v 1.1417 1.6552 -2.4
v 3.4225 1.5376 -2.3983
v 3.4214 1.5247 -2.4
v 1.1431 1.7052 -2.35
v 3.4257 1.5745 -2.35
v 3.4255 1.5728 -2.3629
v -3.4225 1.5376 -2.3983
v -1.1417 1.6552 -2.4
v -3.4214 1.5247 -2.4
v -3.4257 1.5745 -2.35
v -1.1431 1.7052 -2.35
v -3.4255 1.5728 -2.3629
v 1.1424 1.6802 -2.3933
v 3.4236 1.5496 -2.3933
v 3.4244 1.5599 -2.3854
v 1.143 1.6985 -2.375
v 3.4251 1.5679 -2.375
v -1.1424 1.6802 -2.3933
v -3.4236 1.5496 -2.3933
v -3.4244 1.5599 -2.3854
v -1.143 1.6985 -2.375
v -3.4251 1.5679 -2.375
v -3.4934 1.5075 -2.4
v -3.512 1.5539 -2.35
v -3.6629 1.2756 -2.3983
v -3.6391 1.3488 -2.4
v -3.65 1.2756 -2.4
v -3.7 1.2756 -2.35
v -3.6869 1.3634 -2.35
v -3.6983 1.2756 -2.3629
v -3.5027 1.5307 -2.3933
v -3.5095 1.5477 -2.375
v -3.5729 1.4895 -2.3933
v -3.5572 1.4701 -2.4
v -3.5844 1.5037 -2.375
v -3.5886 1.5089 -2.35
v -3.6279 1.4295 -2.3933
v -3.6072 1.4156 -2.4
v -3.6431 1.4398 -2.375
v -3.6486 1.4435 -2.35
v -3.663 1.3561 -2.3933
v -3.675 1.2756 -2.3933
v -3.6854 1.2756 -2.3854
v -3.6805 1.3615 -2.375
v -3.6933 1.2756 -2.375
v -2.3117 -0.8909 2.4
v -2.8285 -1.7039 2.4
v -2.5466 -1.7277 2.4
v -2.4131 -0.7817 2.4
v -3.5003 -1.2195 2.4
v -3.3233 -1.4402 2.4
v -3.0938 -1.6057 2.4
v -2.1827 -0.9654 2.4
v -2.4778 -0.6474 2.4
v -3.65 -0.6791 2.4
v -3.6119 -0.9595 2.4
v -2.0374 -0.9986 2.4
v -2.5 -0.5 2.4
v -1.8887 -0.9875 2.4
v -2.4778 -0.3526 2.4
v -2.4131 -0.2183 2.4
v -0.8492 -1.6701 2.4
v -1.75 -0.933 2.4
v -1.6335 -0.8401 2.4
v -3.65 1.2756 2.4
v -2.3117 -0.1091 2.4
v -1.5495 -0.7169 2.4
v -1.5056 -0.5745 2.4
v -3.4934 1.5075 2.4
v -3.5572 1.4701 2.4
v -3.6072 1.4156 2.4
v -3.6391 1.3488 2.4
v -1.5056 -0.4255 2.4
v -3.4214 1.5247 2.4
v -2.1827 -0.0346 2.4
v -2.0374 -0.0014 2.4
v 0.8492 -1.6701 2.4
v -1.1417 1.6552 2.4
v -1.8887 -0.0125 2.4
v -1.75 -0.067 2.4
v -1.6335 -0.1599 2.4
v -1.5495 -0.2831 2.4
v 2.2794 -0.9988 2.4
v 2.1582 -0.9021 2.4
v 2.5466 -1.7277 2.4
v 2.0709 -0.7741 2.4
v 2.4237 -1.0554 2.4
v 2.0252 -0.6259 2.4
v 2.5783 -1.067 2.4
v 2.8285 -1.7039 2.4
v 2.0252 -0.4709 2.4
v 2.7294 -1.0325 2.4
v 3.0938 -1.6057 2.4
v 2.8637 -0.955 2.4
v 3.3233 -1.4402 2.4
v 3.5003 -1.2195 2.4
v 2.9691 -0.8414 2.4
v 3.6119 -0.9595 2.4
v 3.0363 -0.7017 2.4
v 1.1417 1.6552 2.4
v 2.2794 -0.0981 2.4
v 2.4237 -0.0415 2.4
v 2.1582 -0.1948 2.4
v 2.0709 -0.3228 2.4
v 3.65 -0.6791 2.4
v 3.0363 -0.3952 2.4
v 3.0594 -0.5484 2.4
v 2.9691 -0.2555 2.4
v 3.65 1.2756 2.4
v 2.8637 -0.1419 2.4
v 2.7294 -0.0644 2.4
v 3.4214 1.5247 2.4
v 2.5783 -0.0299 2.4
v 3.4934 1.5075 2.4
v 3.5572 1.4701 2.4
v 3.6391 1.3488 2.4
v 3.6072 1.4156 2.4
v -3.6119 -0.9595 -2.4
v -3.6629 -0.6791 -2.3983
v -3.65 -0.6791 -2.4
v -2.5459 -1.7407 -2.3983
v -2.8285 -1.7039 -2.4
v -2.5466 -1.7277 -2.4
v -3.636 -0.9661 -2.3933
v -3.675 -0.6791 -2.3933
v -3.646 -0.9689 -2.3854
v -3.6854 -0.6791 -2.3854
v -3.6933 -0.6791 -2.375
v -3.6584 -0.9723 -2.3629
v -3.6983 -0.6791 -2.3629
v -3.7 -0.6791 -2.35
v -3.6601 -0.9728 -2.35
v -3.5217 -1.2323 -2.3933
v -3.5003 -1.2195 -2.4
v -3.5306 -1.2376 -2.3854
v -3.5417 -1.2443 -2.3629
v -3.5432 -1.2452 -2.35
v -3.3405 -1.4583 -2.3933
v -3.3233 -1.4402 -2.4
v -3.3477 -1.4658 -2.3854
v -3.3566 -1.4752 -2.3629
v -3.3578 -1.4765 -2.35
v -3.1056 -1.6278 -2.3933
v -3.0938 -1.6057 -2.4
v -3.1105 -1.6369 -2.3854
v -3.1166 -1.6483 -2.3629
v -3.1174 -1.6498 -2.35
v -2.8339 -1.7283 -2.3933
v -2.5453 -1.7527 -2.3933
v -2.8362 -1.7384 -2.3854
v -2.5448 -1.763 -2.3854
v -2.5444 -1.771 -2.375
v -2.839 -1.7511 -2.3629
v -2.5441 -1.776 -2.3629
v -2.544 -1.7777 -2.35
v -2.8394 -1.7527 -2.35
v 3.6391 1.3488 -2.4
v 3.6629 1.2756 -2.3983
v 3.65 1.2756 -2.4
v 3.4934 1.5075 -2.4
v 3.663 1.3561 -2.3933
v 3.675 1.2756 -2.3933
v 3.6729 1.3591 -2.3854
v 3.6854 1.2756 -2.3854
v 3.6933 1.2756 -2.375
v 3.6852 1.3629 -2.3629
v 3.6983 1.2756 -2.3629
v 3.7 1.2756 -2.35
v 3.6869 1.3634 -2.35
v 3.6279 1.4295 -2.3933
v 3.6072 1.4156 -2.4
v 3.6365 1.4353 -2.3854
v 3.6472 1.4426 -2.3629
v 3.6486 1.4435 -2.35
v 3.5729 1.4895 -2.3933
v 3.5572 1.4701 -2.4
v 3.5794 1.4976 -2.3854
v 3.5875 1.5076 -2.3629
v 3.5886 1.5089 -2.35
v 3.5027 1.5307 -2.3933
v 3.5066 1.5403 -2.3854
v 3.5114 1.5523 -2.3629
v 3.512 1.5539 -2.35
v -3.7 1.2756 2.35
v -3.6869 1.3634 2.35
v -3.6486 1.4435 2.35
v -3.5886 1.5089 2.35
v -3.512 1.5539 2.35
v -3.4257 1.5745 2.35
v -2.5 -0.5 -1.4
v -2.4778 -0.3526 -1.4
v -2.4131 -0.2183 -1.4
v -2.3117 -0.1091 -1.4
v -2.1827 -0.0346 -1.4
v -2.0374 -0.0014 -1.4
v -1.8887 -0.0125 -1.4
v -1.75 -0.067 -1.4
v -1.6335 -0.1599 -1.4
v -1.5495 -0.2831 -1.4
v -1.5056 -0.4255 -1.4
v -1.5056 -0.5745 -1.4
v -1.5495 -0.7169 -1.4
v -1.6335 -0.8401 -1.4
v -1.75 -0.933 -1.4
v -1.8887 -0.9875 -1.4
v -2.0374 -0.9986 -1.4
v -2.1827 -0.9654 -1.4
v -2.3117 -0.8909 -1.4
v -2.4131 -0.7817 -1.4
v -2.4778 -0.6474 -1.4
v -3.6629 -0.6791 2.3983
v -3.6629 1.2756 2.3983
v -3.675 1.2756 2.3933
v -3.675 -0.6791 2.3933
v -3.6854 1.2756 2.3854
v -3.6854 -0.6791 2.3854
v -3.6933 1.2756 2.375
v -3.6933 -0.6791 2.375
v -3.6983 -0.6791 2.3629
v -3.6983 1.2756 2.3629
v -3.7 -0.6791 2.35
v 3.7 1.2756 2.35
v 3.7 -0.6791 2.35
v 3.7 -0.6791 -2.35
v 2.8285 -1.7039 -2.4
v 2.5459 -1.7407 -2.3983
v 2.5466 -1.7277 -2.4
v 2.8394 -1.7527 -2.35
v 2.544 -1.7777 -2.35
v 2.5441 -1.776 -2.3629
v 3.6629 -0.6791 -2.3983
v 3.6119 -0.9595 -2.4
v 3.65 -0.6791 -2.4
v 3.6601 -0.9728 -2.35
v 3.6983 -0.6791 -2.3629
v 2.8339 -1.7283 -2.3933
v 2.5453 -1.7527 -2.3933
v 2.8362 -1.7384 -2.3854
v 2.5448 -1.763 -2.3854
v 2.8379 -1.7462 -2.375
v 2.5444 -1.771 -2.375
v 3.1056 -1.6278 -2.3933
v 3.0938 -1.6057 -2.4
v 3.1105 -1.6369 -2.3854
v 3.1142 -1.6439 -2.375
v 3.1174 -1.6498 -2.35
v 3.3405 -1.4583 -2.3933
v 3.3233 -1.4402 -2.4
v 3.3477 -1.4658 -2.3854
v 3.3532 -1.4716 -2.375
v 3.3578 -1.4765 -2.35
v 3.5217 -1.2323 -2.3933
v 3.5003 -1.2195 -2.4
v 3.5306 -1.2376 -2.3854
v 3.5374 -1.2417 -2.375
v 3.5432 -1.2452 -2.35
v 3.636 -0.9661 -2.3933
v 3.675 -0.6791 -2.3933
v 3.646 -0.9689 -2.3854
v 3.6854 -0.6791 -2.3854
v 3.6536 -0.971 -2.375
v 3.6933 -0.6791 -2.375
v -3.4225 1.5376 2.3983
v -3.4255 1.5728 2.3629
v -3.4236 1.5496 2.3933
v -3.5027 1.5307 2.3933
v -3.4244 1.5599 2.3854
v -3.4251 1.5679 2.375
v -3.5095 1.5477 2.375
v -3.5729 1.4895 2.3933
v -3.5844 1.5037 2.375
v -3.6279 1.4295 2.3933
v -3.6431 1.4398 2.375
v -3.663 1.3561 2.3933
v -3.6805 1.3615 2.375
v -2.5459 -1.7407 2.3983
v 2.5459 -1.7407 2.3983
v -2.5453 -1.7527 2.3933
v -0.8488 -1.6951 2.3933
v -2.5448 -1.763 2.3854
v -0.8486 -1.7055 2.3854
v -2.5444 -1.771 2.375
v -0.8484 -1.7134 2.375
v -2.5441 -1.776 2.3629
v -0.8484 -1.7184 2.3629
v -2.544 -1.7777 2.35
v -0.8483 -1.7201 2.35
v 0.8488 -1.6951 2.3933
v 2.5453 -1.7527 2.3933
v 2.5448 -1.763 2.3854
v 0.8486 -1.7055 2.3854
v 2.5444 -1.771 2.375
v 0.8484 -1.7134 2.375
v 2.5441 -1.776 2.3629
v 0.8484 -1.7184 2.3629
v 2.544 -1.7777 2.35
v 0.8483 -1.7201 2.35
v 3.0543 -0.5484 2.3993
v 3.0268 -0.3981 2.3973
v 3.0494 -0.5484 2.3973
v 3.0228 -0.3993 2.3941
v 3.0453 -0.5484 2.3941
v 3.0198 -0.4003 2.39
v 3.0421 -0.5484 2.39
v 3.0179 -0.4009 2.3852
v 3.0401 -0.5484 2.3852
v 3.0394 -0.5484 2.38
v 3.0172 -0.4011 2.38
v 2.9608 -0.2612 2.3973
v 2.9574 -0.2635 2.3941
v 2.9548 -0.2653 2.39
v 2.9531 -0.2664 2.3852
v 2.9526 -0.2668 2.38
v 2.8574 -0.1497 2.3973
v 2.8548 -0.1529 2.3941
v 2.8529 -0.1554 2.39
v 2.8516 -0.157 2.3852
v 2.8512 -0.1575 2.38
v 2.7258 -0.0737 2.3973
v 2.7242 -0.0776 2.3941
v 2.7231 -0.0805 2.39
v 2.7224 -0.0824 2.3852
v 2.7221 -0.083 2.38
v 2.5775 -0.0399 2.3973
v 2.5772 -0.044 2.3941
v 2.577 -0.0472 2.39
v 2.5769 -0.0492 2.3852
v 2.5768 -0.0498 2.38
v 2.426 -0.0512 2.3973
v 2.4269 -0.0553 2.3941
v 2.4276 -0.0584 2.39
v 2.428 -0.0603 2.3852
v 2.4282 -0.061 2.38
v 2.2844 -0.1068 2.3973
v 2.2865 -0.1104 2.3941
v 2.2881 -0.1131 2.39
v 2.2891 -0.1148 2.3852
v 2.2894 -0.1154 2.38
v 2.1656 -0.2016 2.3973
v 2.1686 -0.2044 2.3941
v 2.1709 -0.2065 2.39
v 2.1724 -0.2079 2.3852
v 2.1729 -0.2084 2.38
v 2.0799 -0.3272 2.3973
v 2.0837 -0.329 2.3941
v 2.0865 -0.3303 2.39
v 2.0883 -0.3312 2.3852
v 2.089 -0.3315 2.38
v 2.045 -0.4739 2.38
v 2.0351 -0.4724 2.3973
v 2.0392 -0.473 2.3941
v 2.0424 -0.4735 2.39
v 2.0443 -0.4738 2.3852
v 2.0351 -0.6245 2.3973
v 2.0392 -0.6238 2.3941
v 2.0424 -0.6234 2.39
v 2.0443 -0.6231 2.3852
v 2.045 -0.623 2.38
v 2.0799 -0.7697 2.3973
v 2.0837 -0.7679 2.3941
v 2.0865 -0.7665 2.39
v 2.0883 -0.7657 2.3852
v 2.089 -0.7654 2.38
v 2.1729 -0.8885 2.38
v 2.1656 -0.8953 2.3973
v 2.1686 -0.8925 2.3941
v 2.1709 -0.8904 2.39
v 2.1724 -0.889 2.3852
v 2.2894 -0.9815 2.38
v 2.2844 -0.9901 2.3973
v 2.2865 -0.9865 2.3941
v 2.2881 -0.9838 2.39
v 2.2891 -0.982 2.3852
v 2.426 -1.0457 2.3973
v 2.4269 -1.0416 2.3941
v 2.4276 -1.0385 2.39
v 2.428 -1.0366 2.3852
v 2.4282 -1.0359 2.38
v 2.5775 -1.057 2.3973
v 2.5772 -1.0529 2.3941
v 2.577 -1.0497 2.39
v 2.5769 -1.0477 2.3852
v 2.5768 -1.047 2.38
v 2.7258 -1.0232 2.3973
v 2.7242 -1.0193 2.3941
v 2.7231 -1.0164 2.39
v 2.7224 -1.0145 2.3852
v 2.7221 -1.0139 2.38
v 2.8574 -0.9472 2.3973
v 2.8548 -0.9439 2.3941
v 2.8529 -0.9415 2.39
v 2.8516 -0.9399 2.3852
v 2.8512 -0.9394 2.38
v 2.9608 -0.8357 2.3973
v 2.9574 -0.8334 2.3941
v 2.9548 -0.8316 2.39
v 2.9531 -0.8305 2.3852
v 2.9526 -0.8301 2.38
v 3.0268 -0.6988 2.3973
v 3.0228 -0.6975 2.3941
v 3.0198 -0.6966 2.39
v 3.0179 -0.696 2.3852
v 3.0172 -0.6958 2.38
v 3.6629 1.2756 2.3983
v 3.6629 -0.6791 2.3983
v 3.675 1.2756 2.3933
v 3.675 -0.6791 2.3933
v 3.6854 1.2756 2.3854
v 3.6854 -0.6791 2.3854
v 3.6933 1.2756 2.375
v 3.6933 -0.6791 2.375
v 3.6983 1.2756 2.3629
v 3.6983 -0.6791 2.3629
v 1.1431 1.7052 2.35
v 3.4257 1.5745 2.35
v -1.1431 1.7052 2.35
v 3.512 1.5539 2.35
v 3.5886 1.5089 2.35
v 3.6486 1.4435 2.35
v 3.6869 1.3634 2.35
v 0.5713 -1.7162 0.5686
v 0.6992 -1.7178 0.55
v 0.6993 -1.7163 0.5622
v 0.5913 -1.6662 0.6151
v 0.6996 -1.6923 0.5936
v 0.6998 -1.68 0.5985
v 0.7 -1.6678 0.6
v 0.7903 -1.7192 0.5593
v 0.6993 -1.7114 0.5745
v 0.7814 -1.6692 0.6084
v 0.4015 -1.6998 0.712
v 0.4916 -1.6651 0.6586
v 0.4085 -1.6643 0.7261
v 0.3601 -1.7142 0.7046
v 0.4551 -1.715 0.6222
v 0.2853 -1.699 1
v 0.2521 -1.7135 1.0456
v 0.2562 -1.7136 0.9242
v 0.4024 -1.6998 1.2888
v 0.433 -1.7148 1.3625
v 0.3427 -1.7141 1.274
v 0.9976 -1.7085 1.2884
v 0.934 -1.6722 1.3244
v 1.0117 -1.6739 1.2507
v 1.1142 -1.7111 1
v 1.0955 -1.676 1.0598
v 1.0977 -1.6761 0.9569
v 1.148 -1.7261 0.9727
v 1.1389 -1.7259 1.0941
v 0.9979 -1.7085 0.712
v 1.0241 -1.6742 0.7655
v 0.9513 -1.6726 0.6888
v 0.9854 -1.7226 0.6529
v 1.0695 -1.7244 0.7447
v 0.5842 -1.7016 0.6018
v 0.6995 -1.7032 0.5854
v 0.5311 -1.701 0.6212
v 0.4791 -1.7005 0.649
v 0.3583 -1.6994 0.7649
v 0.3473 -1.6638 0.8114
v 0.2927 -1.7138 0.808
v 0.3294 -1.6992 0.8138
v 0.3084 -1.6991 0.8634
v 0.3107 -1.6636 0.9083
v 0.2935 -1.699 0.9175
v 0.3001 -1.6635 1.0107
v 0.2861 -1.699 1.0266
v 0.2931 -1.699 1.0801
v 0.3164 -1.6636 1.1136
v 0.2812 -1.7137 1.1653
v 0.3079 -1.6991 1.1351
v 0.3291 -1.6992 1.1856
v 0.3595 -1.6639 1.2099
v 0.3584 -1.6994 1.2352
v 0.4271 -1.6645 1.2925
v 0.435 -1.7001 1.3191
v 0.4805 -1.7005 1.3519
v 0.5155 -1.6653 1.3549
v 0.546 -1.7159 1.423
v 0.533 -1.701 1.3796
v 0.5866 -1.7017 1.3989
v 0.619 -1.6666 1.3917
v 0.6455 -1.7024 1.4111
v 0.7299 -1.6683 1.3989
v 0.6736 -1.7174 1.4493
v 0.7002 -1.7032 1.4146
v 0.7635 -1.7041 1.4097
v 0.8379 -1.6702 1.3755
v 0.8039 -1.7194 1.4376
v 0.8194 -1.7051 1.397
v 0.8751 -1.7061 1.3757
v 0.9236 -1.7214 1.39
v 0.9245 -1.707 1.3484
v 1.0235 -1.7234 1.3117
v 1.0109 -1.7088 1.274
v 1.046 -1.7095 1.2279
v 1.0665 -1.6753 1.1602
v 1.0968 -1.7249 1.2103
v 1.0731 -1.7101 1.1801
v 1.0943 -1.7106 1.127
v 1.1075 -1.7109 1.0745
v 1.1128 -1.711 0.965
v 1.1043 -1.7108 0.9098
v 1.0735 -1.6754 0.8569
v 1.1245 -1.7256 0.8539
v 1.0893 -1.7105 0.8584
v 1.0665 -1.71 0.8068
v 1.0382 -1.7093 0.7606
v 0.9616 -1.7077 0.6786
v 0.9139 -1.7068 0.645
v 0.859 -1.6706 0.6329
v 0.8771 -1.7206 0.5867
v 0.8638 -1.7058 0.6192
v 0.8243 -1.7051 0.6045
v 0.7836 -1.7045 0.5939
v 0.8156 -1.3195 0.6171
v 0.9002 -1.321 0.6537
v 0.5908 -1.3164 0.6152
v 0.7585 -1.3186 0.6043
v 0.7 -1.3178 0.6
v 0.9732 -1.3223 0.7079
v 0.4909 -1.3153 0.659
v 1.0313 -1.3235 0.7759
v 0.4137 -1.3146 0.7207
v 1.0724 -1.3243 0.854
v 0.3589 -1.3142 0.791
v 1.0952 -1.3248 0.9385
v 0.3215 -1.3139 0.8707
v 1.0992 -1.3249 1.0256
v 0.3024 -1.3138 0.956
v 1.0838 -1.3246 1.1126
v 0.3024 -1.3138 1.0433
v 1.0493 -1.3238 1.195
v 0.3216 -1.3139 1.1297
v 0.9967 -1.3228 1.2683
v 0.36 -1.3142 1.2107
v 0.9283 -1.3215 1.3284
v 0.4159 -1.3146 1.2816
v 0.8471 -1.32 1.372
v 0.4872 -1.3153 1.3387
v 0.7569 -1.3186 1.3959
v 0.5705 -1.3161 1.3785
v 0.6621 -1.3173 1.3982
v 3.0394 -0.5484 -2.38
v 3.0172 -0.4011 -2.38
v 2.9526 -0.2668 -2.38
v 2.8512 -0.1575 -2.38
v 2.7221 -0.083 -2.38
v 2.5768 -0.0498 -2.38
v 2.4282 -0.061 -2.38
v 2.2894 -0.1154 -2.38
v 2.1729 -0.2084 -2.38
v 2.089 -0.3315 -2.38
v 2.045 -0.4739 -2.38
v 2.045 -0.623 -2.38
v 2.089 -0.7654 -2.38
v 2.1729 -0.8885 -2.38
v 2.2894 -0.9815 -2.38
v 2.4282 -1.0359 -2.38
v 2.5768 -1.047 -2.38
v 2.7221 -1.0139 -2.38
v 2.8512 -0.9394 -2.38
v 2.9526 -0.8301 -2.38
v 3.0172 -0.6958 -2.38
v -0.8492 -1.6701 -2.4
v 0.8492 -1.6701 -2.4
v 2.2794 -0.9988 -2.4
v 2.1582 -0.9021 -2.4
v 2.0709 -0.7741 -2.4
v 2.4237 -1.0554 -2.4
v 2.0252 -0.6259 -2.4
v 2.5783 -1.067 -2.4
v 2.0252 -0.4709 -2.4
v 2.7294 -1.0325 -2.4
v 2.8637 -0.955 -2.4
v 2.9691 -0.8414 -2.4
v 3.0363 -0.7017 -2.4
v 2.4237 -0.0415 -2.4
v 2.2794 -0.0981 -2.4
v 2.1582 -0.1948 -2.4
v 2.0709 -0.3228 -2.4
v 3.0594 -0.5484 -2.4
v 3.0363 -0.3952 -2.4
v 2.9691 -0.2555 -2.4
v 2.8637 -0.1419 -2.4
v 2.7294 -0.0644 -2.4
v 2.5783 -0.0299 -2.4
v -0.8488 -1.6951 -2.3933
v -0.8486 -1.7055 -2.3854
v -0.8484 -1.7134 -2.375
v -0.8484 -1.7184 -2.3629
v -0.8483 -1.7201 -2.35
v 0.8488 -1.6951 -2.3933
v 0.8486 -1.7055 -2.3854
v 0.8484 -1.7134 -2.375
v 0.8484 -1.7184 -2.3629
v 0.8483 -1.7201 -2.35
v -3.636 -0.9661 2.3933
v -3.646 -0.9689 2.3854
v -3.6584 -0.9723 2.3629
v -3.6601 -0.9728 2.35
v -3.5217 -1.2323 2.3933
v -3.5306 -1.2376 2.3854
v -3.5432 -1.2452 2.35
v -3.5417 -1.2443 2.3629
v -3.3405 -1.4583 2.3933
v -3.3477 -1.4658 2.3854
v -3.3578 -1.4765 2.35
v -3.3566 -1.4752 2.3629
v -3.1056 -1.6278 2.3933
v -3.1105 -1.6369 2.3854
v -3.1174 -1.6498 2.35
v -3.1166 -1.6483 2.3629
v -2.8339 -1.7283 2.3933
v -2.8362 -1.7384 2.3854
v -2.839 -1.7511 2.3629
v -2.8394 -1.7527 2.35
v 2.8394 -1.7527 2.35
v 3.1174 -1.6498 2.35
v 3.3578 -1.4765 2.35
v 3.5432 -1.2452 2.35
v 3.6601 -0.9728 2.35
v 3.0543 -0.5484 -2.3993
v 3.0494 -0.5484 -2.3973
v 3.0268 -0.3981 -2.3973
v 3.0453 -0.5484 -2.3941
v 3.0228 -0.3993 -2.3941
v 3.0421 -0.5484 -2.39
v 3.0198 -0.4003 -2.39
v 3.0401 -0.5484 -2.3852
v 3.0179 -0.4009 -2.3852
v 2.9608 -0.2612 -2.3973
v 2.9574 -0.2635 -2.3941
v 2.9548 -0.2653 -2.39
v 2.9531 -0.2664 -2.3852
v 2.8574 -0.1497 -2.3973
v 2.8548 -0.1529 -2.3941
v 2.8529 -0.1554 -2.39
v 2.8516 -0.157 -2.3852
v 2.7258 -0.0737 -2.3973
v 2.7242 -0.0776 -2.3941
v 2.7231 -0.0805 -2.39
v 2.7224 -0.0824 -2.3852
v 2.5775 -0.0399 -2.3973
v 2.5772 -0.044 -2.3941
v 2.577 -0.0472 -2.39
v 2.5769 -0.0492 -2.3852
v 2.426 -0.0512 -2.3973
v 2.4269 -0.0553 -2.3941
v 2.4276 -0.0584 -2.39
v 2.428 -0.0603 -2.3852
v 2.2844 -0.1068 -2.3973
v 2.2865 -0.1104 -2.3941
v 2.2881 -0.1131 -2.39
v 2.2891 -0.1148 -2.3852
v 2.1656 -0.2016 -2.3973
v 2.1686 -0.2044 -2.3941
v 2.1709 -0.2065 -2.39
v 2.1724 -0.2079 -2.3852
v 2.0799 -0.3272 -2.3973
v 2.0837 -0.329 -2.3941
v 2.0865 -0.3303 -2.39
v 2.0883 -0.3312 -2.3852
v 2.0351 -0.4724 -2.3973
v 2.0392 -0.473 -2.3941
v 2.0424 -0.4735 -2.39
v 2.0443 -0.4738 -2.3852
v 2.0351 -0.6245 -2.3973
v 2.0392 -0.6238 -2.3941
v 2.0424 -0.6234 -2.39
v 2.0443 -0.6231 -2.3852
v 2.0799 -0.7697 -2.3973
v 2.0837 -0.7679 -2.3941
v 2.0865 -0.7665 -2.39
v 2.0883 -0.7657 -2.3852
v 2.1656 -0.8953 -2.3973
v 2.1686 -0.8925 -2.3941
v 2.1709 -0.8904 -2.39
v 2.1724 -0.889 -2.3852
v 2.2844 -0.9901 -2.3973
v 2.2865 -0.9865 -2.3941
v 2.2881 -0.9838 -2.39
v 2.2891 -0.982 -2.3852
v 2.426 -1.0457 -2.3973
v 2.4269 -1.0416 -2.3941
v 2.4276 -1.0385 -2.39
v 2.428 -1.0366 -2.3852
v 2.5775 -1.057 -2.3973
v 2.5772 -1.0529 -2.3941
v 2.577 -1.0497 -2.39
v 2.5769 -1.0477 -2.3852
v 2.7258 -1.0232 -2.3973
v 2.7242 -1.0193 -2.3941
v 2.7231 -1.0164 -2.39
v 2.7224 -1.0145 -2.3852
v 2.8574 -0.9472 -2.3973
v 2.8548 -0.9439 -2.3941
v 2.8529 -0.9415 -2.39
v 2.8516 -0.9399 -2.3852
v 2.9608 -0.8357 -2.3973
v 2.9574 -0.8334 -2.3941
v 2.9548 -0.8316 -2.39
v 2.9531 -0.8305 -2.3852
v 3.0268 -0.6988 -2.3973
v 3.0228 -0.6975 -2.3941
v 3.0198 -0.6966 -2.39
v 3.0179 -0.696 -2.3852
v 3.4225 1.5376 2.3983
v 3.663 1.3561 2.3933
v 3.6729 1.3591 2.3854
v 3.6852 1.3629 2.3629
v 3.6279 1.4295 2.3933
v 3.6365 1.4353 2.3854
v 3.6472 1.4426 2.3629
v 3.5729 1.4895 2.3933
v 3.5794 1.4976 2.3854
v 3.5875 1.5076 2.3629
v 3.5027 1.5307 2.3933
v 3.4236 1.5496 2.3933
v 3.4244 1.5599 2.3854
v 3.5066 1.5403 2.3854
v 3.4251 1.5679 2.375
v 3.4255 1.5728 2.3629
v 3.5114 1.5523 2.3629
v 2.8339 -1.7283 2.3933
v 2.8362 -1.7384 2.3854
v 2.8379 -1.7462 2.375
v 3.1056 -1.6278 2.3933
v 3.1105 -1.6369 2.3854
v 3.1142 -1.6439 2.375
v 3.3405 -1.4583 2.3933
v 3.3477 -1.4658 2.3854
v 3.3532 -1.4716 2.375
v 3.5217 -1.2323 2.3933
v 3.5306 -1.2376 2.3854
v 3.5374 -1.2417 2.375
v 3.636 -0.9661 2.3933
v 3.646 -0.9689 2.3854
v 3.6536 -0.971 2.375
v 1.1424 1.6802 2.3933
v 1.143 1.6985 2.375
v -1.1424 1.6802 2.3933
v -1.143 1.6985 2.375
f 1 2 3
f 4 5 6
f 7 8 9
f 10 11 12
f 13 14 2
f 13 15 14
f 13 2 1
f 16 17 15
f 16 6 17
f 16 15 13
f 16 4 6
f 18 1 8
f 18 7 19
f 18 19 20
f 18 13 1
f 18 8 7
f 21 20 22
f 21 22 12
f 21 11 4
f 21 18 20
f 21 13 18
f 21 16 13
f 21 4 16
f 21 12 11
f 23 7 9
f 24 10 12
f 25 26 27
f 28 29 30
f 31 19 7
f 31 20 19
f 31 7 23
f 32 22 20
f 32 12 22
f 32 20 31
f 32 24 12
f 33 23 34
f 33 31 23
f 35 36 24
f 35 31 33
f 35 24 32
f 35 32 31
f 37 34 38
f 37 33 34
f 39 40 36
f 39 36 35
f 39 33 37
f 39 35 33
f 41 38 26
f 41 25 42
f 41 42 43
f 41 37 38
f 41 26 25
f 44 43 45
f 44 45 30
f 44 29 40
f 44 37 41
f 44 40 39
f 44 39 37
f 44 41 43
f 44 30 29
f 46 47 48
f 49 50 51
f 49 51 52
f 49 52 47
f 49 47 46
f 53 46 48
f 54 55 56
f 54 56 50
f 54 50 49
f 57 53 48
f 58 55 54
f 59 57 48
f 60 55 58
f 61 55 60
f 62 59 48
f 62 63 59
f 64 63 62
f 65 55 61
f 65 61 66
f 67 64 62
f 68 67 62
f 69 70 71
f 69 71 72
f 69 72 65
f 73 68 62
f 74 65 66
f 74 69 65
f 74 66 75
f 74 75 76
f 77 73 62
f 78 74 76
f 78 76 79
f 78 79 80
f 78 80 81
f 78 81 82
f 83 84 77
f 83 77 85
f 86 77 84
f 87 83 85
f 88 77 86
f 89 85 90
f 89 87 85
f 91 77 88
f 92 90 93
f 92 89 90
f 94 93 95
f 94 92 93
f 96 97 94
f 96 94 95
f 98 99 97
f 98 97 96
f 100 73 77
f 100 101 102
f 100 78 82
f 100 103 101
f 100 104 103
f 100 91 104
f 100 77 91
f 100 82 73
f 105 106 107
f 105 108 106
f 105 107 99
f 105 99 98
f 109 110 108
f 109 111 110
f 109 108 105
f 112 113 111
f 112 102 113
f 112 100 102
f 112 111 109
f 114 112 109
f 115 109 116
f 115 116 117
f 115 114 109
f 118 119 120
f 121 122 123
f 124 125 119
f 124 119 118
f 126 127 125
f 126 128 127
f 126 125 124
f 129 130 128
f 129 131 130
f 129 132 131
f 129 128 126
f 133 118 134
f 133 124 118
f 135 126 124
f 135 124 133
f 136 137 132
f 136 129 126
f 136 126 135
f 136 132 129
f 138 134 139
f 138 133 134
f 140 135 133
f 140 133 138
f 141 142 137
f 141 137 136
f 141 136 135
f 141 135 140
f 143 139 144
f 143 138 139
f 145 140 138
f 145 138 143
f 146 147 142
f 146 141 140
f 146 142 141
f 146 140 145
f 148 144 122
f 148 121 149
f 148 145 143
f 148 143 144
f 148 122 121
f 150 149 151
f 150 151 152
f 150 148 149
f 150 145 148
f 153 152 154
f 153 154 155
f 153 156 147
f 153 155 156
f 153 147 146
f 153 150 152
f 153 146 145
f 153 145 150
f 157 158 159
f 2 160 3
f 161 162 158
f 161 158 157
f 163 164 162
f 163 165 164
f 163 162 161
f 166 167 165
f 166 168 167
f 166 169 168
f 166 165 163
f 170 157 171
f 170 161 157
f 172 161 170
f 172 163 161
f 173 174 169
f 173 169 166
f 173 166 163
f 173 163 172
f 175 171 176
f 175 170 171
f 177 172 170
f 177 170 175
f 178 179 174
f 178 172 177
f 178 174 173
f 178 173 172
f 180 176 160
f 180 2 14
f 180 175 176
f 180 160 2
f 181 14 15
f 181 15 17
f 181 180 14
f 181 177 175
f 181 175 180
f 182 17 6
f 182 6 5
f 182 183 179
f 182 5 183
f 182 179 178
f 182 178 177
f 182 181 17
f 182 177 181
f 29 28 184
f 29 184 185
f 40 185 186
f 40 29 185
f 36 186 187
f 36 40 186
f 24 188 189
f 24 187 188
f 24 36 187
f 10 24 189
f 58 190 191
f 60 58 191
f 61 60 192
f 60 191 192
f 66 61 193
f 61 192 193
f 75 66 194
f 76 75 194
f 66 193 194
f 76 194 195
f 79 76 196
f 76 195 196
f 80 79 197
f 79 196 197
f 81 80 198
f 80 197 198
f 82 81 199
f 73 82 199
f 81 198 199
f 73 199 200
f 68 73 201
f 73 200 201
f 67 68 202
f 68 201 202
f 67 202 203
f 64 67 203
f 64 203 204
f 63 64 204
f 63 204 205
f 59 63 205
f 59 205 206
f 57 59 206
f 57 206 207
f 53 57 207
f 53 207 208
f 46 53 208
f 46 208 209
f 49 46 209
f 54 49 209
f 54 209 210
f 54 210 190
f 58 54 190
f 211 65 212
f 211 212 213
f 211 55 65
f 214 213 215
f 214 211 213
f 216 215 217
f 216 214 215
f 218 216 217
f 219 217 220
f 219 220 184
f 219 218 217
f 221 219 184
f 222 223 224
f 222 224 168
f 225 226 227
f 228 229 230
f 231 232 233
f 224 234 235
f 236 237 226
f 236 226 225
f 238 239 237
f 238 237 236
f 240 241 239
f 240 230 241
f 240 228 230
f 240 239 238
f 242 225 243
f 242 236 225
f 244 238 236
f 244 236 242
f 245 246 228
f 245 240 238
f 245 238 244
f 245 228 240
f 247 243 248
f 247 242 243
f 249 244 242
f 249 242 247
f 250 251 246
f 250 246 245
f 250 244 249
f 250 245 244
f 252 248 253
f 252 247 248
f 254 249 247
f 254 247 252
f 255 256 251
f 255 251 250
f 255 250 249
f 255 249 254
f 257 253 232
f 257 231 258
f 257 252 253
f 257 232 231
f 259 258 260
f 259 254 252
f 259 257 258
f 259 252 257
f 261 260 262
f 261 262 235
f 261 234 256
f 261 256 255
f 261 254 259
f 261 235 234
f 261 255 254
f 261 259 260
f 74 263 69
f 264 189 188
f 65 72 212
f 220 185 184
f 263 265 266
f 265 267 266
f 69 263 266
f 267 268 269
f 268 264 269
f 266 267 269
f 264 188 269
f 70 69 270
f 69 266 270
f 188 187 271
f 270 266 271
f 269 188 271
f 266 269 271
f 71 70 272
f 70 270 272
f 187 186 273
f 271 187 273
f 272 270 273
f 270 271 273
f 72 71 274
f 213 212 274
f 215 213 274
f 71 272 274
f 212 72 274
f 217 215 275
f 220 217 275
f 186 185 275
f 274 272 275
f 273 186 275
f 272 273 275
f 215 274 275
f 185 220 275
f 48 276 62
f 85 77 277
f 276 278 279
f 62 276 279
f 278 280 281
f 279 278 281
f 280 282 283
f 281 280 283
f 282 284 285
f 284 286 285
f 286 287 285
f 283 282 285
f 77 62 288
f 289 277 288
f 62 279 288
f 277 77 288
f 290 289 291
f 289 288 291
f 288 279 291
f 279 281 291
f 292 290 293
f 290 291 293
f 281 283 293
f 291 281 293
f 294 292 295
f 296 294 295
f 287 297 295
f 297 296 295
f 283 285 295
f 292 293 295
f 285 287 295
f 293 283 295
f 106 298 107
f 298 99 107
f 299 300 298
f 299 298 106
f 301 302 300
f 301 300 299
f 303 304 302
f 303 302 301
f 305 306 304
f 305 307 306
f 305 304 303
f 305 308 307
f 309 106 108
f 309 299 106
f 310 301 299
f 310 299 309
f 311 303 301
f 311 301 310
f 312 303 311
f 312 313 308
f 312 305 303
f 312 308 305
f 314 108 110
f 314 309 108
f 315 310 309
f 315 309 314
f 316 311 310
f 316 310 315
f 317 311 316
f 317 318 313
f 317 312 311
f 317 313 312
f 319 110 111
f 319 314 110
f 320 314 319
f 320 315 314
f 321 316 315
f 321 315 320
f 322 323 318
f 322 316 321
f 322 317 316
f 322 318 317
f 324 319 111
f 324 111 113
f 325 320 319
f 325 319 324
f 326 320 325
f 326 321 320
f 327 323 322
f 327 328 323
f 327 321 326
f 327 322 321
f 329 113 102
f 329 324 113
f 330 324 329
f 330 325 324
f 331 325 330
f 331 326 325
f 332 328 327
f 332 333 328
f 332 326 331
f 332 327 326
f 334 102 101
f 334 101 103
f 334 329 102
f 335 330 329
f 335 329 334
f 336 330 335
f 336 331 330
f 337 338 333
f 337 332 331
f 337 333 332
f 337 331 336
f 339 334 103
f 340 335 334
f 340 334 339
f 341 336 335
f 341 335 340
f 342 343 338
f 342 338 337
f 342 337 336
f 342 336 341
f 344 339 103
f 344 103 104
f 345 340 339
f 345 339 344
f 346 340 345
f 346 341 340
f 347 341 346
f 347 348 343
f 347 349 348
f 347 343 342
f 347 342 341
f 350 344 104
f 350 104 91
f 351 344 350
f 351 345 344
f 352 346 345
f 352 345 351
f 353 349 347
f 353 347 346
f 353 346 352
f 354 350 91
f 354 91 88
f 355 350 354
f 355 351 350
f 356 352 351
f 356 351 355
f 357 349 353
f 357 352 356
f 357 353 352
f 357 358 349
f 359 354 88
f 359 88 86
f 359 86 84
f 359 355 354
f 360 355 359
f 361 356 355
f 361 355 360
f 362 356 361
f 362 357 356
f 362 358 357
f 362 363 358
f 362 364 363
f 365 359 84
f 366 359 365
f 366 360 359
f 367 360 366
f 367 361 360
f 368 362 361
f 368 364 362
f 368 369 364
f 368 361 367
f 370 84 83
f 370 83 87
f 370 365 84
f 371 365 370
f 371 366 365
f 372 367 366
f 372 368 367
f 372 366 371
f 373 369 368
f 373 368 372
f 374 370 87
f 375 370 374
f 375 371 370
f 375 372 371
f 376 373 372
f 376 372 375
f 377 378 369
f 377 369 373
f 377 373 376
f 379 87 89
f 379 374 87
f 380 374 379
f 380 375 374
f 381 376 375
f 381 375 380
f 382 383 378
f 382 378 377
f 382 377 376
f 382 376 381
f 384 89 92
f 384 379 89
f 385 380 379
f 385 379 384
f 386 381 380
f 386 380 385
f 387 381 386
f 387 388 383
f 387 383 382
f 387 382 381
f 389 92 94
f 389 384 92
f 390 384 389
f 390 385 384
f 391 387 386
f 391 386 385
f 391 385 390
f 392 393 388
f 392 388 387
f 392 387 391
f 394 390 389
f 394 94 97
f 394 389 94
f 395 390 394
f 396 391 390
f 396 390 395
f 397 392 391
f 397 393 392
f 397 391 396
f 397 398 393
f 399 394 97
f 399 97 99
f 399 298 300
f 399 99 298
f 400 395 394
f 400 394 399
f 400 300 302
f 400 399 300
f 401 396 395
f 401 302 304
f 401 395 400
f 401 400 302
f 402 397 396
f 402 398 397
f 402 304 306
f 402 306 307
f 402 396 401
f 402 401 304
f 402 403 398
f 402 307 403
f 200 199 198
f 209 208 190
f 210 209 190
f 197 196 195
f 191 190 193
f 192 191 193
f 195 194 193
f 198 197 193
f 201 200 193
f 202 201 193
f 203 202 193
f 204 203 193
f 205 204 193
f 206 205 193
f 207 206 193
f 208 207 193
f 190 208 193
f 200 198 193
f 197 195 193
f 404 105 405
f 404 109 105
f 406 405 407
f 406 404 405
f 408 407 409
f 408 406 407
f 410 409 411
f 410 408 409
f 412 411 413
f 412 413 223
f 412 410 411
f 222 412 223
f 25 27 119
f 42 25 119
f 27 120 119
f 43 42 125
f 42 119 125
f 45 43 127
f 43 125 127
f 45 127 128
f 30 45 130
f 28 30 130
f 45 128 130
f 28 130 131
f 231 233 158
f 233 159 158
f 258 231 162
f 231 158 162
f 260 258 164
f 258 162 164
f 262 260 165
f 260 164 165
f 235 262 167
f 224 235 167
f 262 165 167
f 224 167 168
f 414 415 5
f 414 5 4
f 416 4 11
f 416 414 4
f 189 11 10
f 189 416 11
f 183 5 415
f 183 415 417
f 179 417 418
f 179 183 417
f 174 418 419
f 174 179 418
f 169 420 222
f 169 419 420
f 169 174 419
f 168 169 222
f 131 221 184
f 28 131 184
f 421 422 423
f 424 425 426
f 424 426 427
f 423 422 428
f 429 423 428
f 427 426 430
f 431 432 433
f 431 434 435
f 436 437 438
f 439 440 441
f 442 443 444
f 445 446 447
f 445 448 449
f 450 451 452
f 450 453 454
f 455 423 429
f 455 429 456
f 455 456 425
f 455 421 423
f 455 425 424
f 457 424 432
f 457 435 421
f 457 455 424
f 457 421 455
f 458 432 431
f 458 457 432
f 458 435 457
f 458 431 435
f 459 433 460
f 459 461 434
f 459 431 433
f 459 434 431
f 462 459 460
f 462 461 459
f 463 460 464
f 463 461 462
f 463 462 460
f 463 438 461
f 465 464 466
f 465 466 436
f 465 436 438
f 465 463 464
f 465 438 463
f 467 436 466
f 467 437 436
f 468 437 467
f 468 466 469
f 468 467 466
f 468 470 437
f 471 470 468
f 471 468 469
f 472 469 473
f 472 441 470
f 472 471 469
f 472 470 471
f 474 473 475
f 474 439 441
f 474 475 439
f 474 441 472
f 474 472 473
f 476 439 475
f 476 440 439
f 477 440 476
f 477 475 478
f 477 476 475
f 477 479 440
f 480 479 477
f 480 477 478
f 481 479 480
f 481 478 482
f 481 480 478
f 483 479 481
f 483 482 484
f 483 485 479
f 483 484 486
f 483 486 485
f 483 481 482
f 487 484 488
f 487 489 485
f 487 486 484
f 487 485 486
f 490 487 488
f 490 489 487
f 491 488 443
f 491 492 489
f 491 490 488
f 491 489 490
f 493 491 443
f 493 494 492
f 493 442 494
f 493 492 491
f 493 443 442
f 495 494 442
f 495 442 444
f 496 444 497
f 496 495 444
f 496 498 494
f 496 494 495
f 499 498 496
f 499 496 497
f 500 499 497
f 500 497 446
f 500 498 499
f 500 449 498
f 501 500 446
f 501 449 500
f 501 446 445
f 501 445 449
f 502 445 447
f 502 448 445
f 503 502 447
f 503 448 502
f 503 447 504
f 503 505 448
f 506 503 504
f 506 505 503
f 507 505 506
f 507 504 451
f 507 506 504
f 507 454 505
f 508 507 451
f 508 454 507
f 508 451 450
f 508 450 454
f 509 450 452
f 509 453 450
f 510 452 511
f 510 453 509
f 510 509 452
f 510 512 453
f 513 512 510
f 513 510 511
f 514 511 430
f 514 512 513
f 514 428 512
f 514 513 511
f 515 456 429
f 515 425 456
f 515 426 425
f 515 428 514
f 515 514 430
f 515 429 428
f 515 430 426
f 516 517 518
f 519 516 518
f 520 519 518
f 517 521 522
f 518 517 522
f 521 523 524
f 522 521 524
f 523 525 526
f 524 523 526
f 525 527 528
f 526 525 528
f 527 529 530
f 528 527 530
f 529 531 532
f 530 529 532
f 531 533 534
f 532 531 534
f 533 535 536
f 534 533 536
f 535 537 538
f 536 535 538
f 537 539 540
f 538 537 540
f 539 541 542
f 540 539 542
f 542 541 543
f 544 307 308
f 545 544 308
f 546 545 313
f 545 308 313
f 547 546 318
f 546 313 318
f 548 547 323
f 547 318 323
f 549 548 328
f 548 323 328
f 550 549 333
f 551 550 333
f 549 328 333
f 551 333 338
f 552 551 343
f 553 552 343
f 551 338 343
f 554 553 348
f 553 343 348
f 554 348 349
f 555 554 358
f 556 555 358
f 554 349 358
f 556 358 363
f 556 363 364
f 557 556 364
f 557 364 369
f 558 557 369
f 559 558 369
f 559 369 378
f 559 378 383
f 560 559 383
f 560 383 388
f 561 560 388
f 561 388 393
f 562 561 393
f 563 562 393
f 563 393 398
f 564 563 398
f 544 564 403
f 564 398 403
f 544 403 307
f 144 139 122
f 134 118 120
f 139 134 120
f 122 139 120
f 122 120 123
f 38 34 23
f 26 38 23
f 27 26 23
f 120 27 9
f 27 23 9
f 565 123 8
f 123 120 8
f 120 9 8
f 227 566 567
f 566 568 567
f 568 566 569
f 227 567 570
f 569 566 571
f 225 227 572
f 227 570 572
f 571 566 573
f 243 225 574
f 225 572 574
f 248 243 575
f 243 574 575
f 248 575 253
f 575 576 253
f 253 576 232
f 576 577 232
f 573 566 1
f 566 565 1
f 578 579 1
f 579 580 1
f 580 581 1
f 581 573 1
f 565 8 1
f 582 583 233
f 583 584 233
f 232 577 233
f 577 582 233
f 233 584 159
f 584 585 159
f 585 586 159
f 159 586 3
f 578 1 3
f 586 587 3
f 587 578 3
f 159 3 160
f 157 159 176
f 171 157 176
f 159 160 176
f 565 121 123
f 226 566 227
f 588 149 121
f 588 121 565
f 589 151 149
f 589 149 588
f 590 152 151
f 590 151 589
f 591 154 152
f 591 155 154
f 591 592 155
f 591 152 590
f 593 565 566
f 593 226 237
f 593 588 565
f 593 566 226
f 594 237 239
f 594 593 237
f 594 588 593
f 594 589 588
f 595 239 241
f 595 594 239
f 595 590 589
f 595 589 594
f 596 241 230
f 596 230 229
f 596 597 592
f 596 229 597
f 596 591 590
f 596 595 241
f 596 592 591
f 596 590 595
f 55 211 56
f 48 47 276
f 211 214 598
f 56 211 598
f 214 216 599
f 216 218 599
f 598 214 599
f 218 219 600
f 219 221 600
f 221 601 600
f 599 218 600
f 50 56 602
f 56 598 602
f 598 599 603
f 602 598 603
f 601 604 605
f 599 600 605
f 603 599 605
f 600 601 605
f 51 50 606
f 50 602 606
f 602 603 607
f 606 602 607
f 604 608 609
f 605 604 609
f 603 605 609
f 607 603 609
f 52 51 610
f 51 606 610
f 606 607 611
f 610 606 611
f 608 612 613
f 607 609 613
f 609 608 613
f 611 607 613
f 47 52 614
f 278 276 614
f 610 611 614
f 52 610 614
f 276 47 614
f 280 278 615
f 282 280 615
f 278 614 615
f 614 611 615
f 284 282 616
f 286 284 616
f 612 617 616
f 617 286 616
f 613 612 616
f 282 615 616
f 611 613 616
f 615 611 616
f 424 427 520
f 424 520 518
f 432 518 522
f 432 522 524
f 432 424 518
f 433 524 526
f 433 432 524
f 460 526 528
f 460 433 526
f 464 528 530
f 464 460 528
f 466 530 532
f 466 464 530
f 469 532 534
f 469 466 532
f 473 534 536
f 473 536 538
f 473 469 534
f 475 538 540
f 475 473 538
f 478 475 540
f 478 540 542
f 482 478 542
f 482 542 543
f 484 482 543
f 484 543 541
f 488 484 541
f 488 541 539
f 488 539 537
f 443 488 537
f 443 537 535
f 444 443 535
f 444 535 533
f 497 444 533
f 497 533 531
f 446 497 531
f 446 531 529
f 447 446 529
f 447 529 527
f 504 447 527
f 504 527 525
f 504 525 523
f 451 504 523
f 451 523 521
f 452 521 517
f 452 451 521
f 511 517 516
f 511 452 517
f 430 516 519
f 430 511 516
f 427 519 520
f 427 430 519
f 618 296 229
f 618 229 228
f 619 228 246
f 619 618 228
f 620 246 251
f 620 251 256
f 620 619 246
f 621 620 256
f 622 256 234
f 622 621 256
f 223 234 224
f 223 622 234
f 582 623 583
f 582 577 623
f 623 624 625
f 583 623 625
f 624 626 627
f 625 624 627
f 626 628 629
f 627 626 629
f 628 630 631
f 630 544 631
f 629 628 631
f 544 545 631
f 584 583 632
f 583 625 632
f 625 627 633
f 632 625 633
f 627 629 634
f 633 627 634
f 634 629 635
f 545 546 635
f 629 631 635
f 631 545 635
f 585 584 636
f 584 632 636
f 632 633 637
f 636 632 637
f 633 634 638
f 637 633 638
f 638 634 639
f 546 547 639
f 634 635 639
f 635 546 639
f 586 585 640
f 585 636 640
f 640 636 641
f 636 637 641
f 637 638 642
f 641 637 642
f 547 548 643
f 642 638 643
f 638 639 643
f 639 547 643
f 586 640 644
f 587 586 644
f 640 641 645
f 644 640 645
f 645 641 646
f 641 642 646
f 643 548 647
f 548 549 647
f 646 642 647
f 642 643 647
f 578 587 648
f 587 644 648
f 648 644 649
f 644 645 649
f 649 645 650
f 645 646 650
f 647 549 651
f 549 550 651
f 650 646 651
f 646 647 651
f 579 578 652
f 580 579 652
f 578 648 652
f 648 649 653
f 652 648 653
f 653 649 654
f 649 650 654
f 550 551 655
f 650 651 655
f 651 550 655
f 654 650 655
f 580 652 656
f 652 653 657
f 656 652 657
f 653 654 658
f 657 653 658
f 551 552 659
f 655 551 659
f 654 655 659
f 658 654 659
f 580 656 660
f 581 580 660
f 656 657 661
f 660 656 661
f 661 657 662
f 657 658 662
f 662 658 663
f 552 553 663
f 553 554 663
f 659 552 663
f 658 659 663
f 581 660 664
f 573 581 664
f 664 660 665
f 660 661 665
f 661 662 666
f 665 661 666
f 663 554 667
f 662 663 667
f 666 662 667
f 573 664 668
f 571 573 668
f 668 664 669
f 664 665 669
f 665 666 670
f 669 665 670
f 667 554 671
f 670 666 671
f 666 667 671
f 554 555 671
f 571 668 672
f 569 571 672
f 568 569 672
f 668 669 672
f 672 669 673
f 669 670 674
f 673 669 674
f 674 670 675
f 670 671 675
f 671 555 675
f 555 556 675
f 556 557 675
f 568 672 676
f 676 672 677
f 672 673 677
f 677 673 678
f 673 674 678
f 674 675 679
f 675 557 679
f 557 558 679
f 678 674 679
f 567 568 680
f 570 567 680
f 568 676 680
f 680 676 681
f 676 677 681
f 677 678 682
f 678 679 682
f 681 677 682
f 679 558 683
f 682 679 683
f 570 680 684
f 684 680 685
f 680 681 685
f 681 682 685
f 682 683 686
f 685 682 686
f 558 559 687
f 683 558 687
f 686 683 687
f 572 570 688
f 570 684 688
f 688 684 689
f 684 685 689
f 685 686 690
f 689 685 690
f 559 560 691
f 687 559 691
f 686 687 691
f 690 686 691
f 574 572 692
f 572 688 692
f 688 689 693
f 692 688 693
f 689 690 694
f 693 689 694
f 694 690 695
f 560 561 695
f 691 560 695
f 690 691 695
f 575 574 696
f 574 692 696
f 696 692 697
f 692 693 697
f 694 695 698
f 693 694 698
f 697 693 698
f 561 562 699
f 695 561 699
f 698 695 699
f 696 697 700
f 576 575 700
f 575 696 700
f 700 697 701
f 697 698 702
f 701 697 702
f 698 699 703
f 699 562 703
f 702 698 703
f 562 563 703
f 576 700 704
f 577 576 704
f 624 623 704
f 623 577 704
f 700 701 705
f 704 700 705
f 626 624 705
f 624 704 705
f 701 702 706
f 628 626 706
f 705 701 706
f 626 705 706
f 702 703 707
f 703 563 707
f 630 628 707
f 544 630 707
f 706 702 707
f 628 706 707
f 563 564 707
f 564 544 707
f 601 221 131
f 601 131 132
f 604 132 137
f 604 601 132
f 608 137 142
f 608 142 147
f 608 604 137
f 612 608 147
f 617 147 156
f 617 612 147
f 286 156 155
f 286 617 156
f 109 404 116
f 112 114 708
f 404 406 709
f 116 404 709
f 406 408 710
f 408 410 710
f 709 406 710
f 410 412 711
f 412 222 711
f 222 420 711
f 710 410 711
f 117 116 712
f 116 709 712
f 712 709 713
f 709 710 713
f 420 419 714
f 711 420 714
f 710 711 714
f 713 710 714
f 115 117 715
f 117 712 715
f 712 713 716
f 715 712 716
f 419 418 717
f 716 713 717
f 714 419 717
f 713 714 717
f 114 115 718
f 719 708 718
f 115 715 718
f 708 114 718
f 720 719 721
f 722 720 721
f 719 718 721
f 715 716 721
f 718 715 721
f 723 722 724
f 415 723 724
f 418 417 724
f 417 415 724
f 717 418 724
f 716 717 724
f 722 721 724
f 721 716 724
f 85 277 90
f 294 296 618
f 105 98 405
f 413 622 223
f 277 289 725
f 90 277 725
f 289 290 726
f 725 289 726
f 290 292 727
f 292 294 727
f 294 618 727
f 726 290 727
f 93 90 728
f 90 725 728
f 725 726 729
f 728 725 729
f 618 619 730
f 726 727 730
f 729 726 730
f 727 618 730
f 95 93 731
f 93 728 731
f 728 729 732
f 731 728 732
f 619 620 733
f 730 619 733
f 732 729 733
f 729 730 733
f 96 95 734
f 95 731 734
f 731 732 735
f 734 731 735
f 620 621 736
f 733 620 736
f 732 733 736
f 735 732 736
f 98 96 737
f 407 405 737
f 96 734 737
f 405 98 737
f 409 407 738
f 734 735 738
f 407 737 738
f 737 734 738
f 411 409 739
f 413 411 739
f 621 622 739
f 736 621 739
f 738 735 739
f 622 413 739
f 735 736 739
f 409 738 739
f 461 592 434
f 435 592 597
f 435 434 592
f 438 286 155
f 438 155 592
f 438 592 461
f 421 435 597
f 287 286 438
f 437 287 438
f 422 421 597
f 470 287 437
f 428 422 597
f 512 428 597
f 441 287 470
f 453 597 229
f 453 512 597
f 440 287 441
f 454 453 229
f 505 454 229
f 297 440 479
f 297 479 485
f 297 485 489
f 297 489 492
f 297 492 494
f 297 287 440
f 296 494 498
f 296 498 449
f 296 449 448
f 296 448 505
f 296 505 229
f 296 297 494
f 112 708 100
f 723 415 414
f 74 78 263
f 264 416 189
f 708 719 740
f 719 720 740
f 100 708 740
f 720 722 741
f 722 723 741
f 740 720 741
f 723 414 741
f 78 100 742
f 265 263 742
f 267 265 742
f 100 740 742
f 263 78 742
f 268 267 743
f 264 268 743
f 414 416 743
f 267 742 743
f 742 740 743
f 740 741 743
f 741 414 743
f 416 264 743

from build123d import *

# Parameters (mm, degrees)
SKETCH1_W               = 7.4
SKETCH1_H               = 3.7
BOSS_EXTRUDE1_DEPTH     = 2.4
CUT_EXTRUDE1_DEPTH      = 4.8
FILLET1_R               = 1.1
FILLET2_R               = 0.3
FILLET3_R               = 0.05
CUT_EXTRUDE2_START      = -1
SKETCH3_R               = 0.5
CUT_EXTRUDE2_DEPTH      = 7.4
FILLET4_R               = 0.02
CUT_EXTRUDE3_START      = -1
SKETCH4_R               = 0.5
CUT_EXTRUDE3_DEPTH      = 4.5
CUT_EXTRUDE4_REACH      = 16.756
CUT_EXTRUDE4_END_RADIUS = 50.4
CUT_EXTRUDE4_START      = -10
SKETCH5_R               = 0.4
FILLET5_R               = 0.05


with BuildPart() as part:
    # Sketch1 → Boss-Extrude1 (new, symmetric)
    with BuildSketch(Plane.XY):
        Rectangle(SKETCH1_W, SKETCH1_H)
    extrude(amount=BOSS_EXTRUDE1_DEPTH, both=True)

    # Sketch2 → Cut-Extrude1 (cut)
    with BuildSketch(Plane.XY.offset(2.4)):
        with BuildLine():
            Line((-3.7, 1.55), (-7.120690005, 4.011417256))
            Line((-7.120690005, 4.011417256), (5.535860742, 3.886722174))
            Line((5.535860742, 3.886722174), (3.7, 1.55))
            ThreePointArc((3.7, 1.55), (0, 1.721492621), (-3.7, 1.55))
        make_face()
        with BuildLine():
            Line((3.7, -1.85), (0.350623614, -3.782025322))
            Line((0.350623614, -3.782025322), (-3.7, -1.85))
            ThreePointArc((-3.7, -1.85), (0, -1.712912069), (3.7, -1.85))
        make_face()
    extrude(amount=-CUT_EXTRUDE1_DEPTH, mode=Mode.SUBTRACT)

    # Fillet1
    fillet1_edges = [part.edges().sort_by_distance(p)[0] for p in [
        (3.7, -1.85, 0),
        (-3.7, -1.85, 0),
    ]]
    fillet(fillet1_edges, radius=FILLET1_R)

    # Fillet2
    fillet2_edges = [part.edges().sort_by_distance(p)[0] for p in [
        (3.7, 1.55, 0),
        (-3.7, 1.55, 0),
    ]]
    fillet(fillet2_edges, radius=FILLET2_R)

    # Fillet3
    fillet3_edges = [part.edges().sort_by_distance(p)[0] for p in [
        (3.7, 0.298266493, -2.4),
        (3.7, 0.298266493, 2.4),
        (0, -1.712912069, -2.4),
        (-3.35777122, -1.476459629, -2.4),
        (3.35777122, -1.476459629, -2.4),
        (0, -1.712912069, 2.4),
        (-3.35777122, -1.476459629, 2.4),
        (3.35777122, -1.476459629, 2.4),
        (0, 1.721492621, 2.4),
        (-3.7, 0.298266493, 2.4),
        (-3.621029193, 1.478477738, 2.4),
        (3.621029193, 1.478477738, 2.4),
        (0, 1.721492621, -2.4),
        (-3.7, 0.298266493, -2.4),
        (-3.621029193, 1.478477738, -2.4),
        (3.621029193, 1.478477738, -2.4),
    ]]
    fillet(fillet3_edges, radius=FILLET3_R)

    # Sketch3 → Cut-Extrude2 (cut, symmetric)
    with BuildSketch(Plane.XY.offset(2.4).offset(CUT_EXTRUDE2_START)):
        with Locations((2.539436079, -0.548443568)):
            Circle(SKETCH3_R)
    extrude(amount=CUT_EXTRUDE2_DEPTH, both=True, mode=Mode.SUBTRACT)

    # Fillet4
    fillet4_edges = [part.edges().sort_by_distance(p)[0] for p in [
        (2.039436079, -0.548443568, 2.4),
        (2.039436079, -0.548443568, -2.4),
    ]]
    fillet(fillet4_edges, radius=FILLET4_R)

    # Sketch4 → Cut-Extrude3 (cut)
    with BuildSketch(Plane(origin=(0, 0, -2.4), x_dir=(-1, 0, 0), z_dir=(0, 0, -1)).offset(CUT_EXTRUDE3_START)):
        with Locations((2, -0.5)):
            Circle(SKETCH4_R)
    extrude(amount=-CUT_EXTRUDE3_DEPTH, mode=Mode.SUBTRACT)

    # Cut-Extrude4: up to this cylinder (the profile starts inside it)
    cut_extrude4_end = Plane(origin=(0, -51.712912069, 1), z_dir=(0, 0, 1)) * Cylinder(CUT_EXTRUDE4_END_RADIUS, 135.312, mode=Mode.PRIVATE)
    # Sketch5 → Cut-Extrude4 (cut, up to the surface)
    with BuildSketch(Plane(origin=(0, 0, 0), x_dir=(1, 0, 0), z_dir=(0, 1, 0)).offset(CUT_EXTRUDE4_START), mode=Mode.PRIVATE) as cut_extrude4_sk1:
        with Locations(Location((0.7, -1, 0), (0, 0, 90))):
            Circle(SKETCH5_R)
    cut_extrude4_tool1 = extrude(cut_extrude4_sk1.sketch, amount=CUT_EXTRUDE4_REACH, mode=Mode.PRIVATE) & cut_extrude4_end
    add(cut_extrude4_tool1.solids().sort_by_distance((0.7, -10, 1))[0], mode=Mode.SUBTRACT)

    # Fillet5
    fillet5_edges = [part.edges().sort_by_distance(p)[0] for p in [
        (0.700029875, -1.717812727, 1.399999999),
    ]]
    fillet(fillet5_edges, radius=FILLET5_R)


solid = part.part
